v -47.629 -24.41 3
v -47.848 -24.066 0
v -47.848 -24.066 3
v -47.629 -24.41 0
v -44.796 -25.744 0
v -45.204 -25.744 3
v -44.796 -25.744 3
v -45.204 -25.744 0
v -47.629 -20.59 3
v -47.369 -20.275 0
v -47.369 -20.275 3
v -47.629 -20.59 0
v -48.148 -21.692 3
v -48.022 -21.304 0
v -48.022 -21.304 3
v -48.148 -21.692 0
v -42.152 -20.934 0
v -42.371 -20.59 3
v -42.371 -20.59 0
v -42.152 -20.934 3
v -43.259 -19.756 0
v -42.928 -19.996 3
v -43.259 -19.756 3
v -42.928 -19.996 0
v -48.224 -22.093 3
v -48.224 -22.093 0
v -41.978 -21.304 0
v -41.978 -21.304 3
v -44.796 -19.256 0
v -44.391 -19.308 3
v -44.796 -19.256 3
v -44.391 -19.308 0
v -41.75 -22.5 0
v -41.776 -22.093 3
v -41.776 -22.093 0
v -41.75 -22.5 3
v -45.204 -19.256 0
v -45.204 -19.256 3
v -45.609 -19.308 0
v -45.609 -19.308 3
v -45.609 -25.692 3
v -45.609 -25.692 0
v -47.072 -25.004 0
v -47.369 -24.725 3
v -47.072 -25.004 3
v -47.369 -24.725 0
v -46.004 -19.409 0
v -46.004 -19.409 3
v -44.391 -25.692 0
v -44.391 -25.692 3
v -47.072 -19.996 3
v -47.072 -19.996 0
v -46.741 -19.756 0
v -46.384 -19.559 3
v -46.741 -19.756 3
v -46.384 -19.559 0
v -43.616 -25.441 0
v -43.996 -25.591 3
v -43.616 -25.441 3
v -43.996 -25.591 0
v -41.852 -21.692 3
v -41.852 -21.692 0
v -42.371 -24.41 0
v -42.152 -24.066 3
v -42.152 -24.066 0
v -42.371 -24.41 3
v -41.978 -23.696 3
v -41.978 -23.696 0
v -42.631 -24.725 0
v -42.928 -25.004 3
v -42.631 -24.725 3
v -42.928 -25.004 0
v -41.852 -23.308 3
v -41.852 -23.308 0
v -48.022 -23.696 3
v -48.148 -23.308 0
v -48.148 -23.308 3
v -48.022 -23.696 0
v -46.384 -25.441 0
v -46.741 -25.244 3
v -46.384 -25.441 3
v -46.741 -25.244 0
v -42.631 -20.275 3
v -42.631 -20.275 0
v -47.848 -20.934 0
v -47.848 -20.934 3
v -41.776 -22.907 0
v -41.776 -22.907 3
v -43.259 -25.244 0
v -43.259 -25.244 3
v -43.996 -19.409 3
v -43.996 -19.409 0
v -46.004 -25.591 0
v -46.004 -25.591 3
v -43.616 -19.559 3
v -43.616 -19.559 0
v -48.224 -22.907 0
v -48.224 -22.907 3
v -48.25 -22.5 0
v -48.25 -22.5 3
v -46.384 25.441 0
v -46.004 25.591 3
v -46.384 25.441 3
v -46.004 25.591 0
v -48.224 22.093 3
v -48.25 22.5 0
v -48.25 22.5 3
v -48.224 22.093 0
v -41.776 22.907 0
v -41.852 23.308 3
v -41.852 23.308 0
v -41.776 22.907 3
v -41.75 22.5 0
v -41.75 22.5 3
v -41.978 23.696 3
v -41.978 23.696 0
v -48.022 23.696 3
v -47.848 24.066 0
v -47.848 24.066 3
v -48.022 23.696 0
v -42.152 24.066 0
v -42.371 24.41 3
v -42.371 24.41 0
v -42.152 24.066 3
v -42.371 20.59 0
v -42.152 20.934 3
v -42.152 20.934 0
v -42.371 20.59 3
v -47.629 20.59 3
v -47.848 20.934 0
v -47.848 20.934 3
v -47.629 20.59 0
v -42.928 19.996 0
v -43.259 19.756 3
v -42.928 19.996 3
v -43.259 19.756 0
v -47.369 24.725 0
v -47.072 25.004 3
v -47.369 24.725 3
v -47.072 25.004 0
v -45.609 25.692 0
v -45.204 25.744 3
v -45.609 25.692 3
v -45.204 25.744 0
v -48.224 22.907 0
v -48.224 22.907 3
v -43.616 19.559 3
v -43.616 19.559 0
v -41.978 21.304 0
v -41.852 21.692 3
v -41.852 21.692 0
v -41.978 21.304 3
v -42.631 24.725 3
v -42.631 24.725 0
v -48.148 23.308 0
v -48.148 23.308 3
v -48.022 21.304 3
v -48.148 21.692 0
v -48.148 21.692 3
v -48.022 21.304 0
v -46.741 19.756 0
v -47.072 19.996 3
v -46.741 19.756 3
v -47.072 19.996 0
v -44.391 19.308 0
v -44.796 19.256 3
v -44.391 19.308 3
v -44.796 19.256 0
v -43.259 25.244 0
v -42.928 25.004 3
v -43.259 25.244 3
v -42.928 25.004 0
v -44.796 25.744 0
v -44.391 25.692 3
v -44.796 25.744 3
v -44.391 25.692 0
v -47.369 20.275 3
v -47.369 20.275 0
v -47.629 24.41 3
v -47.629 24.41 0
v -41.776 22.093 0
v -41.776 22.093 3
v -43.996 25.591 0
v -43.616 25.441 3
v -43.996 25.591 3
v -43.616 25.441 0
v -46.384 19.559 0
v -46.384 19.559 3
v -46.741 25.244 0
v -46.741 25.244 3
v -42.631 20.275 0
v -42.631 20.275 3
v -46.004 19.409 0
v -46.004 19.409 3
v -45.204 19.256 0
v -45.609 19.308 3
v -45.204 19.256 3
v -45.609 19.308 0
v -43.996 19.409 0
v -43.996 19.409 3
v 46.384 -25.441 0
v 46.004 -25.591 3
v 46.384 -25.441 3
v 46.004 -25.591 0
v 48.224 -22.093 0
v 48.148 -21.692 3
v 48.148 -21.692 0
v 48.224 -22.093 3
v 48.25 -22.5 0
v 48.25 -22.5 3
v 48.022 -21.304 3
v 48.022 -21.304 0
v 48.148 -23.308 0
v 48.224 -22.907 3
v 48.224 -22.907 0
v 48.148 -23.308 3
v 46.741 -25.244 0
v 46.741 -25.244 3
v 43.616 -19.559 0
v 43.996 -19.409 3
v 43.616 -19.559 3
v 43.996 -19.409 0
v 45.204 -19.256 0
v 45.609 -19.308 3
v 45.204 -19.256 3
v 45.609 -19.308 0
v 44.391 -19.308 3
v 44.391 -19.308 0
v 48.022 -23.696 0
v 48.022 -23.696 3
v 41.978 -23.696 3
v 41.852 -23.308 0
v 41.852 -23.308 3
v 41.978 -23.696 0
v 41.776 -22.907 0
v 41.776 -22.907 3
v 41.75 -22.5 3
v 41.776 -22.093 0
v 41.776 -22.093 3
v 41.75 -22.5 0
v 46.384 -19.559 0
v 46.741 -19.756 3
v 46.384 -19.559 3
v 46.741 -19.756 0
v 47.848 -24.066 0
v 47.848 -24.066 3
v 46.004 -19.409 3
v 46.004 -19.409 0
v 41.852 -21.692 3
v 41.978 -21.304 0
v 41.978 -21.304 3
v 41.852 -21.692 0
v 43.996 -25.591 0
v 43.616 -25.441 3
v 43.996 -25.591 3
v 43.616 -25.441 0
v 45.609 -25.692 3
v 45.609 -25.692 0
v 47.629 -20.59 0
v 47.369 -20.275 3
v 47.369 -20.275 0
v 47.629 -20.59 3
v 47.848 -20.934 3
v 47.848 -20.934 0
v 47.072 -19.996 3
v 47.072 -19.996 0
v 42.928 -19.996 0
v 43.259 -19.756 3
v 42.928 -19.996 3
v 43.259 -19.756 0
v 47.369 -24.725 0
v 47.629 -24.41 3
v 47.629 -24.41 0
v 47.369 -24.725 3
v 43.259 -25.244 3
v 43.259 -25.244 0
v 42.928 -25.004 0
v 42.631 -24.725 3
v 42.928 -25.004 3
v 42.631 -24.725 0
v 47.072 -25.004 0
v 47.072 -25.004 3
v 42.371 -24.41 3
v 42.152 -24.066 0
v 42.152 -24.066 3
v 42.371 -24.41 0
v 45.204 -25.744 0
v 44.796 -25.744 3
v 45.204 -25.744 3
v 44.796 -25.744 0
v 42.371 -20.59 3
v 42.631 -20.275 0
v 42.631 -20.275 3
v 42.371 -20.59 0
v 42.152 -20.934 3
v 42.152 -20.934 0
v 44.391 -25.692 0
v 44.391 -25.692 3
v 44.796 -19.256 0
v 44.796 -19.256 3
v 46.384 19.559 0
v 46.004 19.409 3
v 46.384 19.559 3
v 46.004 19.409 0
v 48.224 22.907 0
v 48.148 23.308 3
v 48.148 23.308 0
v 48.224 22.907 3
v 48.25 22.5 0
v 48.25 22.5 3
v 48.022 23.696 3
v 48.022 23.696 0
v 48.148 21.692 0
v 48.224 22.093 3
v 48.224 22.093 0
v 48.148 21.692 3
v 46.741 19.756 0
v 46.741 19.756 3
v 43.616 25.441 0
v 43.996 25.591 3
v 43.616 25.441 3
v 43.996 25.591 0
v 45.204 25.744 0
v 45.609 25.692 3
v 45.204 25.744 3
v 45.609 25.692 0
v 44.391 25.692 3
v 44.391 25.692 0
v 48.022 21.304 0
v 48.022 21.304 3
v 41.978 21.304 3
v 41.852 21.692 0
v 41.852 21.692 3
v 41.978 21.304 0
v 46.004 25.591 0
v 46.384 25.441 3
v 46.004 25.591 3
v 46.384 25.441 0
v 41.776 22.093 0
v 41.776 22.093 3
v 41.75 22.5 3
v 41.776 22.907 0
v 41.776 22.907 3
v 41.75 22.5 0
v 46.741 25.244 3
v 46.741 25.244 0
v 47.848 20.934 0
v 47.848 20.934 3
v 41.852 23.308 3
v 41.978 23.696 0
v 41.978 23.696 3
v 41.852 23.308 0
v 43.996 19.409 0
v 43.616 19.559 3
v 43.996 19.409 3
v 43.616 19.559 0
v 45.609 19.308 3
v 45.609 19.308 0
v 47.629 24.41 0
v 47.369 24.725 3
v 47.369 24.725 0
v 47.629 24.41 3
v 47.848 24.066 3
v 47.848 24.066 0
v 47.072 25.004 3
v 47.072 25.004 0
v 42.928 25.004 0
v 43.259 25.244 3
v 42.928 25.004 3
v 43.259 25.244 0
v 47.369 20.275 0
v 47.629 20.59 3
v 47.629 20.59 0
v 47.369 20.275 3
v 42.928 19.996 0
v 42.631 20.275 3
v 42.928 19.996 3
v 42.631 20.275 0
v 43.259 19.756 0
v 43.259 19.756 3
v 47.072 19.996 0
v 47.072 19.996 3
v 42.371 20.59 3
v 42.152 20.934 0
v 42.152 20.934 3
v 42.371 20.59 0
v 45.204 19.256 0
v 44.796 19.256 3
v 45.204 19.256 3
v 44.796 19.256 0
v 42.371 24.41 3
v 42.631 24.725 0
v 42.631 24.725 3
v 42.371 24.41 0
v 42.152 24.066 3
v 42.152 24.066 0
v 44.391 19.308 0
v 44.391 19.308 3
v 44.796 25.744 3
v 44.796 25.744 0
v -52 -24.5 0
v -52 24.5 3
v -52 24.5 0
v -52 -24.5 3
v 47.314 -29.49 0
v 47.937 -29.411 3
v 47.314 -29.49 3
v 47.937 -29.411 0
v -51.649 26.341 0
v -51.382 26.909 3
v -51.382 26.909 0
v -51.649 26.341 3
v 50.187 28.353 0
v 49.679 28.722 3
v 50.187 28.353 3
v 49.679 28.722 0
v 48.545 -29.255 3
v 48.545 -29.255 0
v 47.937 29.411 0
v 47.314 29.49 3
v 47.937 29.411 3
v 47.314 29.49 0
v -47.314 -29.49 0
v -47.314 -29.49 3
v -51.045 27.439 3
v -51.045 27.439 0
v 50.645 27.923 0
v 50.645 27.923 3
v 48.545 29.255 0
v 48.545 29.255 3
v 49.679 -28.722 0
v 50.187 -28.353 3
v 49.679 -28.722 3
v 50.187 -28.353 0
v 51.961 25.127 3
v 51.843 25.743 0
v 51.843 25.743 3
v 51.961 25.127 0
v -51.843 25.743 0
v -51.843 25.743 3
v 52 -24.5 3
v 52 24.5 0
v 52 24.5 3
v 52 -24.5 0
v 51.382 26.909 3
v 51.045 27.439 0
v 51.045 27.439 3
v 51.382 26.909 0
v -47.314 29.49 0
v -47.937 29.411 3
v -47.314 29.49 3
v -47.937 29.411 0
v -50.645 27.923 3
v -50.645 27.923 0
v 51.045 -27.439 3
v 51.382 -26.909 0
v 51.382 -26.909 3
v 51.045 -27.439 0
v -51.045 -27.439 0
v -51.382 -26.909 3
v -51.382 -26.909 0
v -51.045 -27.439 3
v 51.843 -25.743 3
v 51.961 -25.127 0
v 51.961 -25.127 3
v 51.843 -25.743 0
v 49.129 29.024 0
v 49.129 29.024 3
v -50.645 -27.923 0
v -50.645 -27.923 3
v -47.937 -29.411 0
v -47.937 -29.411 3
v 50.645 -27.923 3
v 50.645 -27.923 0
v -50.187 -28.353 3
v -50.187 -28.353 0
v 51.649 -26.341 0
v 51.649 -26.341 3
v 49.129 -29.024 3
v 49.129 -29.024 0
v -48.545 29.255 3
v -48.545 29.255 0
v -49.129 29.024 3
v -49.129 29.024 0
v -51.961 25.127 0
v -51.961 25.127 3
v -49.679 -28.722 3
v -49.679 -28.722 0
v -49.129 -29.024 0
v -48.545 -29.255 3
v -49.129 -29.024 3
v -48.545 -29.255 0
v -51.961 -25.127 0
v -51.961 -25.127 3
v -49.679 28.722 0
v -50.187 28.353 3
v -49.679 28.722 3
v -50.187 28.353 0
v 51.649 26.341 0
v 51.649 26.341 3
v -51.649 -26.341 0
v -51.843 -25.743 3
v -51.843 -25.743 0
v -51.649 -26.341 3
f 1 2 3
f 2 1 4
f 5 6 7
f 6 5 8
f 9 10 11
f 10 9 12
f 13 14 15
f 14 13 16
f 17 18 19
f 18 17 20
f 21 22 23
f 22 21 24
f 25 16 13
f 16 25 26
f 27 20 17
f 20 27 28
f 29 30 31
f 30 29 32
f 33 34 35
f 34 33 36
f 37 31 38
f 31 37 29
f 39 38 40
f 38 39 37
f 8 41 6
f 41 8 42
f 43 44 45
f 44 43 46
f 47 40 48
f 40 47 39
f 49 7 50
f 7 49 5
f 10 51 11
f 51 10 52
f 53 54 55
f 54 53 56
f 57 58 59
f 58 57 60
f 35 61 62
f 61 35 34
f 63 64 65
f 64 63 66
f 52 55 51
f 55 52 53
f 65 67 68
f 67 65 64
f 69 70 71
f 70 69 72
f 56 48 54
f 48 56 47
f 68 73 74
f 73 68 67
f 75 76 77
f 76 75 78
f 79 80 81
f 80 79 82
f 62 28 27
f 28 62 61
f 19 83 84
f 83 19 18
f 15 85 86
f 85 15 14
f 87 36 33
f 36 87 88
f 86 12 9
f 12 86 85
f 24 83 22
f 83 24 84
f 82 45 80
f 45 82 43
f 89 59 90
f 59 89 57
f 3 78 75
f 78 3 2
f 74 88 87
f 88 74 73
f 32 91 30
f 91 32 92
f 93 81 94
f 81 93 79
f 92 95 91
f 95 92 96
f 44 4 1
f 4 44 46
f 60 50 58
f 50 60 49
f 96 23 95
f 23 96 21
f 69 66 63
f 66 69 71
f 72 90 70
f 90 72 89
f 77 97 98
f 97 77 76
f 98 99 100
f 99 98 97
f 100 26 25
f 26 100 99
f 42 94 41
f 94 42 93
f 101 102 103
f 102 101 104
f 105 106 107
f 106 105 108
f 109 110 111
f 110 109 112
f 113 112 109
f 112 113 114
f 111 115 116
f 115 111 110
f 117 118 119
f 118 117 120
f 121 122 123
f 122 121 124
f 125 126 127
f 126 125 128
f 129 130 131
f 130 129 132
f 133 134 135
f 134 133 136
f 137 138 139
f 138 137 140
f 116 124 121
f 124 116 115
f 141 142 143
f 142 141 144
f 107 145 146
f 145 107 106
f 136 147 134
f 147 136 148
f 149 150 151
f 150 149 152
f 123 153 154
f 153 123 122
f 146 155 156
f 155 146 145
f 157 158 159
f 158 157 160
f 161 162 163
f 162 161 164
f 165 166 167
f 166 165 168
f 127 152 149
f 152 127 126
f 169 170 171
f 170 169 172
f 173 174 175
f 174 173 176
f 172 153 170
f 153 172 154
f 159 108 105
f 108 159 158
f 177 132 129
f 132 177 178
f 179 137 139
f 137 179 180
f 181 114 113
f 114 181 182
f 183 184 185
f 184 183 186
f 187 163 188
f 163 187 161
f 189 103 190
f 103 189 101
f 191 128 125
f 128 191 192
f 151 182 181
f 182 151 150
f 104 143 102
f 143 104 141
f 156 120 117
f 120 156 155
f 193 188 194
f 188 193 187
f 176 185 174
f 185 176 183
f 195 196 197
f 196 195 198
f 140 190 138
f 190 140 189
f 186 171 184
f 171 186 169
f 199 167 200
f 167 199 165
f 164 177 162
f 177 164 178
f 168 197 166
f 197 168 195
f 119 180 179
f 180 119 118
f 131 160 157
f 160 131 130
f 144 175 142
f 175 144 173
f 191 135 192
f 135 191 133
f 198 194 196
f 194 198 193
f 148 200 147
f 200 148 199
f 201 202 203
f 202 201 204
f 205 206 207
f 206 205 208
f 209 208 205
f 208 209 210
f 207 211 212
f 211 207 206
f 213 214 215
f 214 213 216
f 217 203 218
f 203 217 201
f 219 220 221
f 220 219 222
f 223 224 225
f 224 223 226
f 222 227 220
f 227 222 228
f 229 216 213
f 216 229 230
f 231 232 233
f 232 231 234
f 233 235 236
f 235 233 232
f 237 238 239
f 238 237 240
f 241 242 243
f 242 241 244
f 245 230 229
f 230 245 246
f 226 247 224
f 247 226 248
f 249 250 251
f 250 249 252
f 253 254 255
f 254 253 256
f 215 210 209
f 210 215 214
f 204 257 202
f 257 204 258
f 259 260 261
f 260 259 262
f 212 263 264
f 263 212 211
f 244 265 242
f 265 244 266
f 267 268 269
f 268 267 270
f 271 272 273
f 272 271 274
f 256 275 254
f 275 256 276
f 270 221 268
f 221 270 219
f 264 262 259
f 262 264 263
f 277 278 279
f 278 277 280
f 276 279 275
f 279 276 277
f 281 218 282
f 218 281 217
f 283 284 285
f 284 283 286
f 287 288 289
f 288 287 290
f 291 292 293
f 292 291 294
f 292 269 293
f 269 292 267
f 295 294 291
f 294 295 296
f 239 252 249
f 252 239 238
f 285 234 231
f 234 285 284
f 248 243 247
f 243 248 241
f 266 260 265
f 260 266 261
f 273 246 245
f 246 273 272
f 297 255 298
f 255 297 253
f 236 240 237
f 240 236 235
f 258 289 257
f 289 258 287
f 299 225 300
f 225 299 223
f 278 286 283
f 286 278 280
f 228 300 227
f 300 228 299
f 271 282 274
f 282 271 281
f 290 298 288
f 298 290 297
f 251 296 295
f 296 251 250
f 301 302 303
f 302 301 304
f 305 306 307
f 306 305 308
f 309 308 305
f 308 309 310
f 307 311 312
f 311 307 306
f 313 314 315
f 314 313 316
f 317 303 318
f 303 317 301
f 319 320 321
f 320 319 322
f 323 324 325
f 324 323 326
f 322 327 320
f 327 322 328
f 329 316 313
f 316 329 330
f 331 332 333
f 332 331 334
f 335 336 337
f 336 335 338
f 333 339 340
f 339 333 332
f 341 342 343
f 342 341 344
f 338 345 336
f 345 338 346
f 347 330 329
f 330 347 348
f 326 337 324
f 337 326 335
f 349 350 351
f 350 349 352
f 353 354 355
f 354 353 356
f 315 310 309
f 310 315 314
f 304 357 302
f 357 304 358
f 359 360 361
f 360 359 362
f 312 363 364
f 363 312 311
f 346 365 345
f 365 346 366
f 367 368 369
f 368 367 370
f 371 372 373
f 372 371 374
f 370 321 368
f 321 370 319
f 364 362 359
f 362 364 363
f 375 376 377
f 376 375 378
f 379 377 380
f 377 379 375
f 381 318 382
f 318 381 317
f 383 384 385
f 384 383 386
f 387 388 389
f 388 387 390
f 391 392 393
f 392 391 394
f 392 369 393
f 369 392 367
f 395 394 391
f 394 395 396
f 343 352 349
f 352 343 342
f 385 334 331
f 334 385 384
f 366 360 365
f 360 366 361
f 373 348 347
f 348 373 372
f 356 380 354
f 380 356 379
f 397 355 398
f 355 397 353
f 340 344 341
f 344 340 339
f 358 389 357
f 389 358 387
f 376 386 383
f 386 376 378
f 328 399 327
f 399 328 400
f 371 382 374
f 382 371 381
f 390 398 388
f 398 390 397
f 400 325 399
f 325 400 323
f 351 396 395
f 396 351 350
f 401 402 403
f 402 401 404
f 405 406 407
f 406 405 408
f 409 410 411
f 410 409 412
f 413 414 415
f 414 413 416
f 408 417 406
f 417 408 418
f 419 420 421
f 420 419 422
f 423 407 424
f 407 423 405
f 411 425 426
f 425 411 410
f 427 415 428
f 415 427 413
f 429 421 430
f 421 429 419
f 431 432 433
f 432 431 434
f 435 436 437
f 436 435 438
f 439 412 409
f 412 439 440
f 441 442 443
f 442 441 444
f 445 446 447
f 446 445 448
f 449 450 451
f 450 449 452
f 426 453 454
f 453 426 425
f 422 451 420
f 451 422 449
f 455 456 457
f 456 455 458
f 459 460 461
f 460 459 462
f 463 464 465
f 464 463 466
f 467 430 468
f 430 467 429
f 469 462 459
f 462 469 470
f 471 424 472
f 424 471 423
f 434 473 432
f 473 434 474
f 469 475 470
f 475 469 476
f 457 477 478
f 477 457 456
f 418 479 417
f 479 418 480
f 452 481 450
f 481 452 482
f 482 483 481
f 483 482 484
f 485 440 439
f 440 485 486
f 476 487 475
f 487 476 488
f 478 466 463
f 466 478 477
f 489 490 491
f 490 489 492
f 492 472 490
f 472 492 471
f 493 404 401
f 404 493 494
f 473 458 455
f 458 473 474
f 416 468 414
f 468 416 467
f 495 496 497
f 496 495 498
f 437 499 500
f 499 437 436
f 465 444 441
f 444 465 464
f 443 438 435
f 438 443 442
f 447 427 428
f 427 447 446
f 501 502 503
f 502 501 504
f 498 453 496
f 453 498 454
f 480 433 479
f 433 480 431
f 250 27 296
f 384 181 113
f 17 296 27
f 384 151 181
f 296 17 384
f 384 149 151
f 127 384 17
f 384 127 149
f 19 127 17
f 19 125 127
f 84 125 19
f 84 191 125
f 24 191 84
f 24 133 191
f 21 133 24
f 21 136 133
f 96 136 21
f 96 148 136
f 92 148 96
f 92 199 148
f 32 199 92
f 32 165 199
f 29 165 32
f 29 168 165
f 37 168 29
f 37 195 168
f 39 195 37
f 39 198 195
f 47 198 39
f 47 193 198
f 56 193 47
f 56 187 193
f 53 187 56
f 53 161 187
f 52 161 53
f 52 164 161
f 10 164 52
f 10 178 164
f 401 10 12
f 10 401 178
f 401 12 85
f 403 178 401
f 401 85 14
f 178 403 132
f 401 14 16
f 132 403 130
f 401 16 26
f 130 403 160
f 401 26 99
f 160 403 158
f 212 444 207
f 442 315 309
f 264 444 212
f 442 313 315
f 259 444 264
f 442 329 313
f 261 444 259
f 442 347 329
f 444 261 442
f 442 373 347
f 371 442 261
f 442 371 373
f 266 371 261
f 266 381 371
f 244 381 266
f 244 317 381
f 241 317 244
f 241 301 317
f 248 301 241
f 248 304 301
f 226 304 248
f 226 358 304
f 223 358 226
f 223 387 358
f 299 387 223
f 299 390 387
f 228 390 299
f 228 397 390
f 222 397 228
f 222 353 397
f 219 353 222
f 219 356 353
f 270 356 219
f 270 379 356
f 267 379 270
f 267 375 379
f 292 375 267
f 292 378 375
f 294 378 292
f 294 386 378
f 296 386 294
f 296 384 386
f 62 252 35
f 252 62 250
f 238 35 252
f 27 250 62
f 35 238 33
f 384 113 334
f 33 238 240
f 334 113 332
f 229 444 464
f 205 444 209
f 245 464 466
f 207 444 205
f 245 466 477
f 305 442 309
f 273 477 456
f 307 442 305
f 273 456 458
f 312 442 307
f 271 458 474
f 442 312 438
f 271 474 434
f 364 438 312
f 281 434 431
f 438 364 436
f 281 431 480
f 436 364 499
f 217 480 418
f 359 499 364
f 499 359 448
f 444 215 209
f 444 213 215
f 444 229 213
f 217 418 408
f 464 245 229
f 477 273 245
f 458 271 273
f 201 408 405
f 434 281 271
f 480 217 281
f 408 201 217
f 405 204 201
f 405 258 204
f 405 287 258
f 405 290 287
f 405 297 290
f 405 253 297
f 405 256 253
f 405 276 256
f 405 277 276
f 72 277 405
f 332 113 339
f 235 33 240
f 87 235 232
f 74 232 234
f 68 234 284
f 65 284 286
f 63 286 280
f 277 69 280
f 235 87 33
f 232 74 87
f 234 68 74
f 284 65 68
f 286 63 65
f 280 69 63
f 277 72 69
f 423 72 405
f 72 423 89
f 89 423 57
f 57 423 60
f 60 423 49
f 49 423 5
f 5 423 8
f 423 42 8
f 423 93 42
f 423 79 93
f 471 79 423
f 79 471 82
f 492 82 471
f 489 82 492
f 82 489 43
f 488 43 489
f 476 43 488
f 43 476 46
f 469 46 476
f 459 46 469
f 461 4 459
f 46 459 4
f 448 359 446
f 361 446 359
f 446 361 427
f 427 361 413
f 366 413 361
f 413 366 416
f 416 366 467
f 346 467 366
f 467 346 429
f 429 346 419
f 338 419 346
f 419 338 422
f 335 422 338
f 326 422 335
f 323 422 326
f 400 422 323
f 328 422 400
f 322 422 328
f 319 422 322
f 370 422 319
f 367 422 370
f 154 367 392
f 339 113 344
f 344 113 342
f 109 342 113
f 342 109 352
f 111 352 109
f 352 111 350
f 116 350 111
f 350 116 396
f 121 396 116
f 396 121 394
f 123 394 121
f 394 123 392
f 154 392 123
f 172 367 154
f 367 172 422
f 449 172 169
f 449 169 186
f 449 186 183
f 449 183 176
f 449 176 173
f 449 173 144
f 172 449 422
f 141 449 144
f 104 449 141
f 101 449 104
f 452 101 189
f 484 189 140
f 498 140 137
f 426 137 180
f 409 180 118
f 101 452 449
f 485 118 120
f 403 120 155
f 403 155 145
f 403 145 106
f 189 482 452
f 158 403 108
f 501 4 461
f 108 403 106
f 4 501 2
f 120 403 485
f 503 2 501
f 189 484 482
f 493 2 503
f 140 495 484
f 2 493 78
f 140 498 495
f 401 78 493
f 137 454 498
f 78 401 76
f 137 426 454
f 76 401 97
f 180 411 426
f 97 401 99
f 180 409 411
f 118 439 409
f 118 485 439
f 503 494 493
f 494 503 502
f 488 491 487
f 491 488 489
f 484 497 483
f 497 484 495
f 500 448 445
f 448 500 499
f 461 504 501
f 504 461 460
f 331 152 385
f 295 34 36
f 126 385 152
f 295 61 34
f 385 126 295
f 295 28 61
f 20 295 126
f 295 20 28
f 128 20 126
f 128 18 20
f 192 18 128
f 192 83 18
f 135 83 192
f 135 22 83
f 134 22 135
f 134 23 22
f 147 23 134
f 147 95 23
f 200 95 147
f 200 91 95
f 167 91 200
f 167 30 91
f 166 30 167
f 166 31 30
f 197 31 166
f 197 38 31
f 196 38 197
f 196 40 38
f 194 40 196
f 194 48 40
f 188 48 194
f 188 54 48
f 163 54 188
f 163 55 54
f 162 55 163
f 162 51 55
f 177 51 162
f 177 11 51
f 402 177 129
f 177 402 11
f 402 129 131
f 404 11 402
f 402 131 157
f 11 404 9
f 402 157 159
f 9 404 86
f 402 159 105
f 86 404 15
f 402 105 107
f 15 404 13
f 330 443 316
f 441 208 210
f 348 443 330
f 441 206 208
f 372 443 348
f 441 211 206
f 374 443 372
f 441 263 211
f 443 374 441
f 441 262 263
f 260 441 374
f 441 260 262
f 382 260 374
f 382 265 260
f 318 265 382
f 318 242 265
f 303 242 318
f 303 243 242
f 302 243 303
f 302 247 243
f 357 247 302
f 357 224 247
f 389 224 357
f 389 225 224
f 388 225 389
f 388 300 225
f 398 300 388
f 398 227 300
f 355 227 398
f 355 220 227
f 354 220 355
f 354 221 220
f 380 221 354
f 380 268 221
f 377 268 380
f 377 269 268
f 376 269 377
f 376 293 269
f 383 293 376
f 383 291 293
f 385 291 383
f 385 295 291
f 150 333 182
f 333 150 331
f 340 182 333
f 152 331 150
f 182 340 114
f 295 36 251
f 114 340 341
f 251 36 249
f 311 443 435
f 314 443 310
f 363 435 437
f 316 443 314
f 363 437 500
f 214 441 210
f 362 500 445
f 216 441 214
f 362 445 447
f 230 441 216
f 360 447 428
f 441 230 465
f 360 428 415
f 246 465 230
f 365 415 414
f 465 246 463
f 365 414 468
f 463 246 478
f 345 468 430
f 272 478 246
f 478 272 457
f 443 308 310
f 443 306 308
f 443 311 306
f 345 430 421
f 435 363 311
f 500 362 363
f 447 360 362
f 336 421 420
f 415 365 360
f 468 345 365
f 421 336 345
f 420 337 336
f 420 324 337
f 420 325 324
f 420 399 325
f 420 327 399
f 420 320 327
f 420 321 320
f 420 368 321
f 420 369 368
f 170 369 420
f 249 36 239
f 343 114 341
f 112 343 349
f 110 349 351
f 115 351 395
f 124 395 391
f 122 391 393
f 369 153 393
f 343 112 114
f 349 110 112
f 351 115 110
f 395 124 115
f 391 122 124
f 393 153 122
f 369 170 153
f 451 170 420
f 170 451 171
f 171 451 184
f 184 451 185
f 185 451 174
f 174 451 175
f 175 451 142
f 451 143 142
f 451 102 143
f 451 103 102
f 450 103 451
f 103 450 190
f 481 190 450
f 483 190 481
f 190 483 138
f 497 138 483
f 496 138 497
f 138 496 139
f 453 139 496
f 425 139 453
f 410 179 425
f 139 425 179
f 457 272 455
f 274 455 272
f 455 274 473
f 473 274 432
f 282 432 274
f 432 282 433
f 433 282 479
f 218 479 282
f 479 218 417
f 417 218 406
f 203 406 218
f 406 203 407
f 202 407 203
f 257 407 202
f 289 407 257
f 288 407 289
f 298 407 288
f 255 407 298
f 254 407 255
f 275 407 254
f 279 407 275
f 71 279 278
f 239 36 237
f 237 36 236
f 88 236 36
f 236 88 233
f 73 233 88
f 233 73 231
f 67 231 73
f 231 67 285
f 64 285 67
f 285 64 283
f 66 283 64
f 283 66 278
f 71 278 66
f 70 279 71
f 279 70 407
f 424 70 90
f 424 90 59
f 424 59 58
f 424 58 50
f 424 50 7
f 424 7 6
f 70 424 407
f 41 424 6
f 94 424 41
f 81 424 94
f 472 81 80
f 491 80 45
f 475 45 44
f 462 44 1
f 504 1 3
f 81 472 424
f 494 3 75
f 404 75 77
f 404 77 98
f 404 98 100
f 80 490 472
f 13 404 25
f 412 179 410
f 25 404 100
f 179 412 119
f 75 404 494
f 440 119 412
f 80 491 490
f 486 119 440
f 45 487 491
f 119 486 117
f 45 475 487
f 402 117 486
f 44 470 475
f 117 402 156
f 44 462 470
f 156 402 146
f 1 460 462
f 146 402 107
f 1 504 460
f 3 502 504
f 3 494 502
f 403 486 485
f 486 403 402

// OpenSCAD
$fn = 50;


difference() {
	union() {
		hull() {
			translate(v = [-47.0000000000, 24.5000000000, 0]) {
				cylinder(h = 3, r = 5);
			}
			translate(v = [47.0000000000, 24.5000000000, 0]) {
				cylinder(h = 3, r = 5);
			}
			translate(v = [-47.0000000000, -24.5000000000, 0]) {
				cylinder(h = 3, r = 5);
			}
			translate(v = [47.0000000000, -24.5000000000, 0]) {
				cylinder(h = 3, r = 5);
			}
		}
	}
	union() {
		translate(v = [-45.0000000000, -22.5000000000, -100.0000000000]) {
			cylinder(h = 200, r = 3.2500000000);
		}
		translate(v = [-45.0000000000, 22.5000000000, -100.0000000000]) {
			cylinder(h = 200, r = 3.2500000000);
		}
		translate(v = [45.0000000000, -22.5000000000, -100.0000000000]) {
			cylinder(h = 200, r = 3.2500000000);
		}
		translate(v = [45.0000000000, 22.5000000000, -100.0000000000]) {
			cylinder(h = 200, r = 3.2500000000);
		}
	}
}
